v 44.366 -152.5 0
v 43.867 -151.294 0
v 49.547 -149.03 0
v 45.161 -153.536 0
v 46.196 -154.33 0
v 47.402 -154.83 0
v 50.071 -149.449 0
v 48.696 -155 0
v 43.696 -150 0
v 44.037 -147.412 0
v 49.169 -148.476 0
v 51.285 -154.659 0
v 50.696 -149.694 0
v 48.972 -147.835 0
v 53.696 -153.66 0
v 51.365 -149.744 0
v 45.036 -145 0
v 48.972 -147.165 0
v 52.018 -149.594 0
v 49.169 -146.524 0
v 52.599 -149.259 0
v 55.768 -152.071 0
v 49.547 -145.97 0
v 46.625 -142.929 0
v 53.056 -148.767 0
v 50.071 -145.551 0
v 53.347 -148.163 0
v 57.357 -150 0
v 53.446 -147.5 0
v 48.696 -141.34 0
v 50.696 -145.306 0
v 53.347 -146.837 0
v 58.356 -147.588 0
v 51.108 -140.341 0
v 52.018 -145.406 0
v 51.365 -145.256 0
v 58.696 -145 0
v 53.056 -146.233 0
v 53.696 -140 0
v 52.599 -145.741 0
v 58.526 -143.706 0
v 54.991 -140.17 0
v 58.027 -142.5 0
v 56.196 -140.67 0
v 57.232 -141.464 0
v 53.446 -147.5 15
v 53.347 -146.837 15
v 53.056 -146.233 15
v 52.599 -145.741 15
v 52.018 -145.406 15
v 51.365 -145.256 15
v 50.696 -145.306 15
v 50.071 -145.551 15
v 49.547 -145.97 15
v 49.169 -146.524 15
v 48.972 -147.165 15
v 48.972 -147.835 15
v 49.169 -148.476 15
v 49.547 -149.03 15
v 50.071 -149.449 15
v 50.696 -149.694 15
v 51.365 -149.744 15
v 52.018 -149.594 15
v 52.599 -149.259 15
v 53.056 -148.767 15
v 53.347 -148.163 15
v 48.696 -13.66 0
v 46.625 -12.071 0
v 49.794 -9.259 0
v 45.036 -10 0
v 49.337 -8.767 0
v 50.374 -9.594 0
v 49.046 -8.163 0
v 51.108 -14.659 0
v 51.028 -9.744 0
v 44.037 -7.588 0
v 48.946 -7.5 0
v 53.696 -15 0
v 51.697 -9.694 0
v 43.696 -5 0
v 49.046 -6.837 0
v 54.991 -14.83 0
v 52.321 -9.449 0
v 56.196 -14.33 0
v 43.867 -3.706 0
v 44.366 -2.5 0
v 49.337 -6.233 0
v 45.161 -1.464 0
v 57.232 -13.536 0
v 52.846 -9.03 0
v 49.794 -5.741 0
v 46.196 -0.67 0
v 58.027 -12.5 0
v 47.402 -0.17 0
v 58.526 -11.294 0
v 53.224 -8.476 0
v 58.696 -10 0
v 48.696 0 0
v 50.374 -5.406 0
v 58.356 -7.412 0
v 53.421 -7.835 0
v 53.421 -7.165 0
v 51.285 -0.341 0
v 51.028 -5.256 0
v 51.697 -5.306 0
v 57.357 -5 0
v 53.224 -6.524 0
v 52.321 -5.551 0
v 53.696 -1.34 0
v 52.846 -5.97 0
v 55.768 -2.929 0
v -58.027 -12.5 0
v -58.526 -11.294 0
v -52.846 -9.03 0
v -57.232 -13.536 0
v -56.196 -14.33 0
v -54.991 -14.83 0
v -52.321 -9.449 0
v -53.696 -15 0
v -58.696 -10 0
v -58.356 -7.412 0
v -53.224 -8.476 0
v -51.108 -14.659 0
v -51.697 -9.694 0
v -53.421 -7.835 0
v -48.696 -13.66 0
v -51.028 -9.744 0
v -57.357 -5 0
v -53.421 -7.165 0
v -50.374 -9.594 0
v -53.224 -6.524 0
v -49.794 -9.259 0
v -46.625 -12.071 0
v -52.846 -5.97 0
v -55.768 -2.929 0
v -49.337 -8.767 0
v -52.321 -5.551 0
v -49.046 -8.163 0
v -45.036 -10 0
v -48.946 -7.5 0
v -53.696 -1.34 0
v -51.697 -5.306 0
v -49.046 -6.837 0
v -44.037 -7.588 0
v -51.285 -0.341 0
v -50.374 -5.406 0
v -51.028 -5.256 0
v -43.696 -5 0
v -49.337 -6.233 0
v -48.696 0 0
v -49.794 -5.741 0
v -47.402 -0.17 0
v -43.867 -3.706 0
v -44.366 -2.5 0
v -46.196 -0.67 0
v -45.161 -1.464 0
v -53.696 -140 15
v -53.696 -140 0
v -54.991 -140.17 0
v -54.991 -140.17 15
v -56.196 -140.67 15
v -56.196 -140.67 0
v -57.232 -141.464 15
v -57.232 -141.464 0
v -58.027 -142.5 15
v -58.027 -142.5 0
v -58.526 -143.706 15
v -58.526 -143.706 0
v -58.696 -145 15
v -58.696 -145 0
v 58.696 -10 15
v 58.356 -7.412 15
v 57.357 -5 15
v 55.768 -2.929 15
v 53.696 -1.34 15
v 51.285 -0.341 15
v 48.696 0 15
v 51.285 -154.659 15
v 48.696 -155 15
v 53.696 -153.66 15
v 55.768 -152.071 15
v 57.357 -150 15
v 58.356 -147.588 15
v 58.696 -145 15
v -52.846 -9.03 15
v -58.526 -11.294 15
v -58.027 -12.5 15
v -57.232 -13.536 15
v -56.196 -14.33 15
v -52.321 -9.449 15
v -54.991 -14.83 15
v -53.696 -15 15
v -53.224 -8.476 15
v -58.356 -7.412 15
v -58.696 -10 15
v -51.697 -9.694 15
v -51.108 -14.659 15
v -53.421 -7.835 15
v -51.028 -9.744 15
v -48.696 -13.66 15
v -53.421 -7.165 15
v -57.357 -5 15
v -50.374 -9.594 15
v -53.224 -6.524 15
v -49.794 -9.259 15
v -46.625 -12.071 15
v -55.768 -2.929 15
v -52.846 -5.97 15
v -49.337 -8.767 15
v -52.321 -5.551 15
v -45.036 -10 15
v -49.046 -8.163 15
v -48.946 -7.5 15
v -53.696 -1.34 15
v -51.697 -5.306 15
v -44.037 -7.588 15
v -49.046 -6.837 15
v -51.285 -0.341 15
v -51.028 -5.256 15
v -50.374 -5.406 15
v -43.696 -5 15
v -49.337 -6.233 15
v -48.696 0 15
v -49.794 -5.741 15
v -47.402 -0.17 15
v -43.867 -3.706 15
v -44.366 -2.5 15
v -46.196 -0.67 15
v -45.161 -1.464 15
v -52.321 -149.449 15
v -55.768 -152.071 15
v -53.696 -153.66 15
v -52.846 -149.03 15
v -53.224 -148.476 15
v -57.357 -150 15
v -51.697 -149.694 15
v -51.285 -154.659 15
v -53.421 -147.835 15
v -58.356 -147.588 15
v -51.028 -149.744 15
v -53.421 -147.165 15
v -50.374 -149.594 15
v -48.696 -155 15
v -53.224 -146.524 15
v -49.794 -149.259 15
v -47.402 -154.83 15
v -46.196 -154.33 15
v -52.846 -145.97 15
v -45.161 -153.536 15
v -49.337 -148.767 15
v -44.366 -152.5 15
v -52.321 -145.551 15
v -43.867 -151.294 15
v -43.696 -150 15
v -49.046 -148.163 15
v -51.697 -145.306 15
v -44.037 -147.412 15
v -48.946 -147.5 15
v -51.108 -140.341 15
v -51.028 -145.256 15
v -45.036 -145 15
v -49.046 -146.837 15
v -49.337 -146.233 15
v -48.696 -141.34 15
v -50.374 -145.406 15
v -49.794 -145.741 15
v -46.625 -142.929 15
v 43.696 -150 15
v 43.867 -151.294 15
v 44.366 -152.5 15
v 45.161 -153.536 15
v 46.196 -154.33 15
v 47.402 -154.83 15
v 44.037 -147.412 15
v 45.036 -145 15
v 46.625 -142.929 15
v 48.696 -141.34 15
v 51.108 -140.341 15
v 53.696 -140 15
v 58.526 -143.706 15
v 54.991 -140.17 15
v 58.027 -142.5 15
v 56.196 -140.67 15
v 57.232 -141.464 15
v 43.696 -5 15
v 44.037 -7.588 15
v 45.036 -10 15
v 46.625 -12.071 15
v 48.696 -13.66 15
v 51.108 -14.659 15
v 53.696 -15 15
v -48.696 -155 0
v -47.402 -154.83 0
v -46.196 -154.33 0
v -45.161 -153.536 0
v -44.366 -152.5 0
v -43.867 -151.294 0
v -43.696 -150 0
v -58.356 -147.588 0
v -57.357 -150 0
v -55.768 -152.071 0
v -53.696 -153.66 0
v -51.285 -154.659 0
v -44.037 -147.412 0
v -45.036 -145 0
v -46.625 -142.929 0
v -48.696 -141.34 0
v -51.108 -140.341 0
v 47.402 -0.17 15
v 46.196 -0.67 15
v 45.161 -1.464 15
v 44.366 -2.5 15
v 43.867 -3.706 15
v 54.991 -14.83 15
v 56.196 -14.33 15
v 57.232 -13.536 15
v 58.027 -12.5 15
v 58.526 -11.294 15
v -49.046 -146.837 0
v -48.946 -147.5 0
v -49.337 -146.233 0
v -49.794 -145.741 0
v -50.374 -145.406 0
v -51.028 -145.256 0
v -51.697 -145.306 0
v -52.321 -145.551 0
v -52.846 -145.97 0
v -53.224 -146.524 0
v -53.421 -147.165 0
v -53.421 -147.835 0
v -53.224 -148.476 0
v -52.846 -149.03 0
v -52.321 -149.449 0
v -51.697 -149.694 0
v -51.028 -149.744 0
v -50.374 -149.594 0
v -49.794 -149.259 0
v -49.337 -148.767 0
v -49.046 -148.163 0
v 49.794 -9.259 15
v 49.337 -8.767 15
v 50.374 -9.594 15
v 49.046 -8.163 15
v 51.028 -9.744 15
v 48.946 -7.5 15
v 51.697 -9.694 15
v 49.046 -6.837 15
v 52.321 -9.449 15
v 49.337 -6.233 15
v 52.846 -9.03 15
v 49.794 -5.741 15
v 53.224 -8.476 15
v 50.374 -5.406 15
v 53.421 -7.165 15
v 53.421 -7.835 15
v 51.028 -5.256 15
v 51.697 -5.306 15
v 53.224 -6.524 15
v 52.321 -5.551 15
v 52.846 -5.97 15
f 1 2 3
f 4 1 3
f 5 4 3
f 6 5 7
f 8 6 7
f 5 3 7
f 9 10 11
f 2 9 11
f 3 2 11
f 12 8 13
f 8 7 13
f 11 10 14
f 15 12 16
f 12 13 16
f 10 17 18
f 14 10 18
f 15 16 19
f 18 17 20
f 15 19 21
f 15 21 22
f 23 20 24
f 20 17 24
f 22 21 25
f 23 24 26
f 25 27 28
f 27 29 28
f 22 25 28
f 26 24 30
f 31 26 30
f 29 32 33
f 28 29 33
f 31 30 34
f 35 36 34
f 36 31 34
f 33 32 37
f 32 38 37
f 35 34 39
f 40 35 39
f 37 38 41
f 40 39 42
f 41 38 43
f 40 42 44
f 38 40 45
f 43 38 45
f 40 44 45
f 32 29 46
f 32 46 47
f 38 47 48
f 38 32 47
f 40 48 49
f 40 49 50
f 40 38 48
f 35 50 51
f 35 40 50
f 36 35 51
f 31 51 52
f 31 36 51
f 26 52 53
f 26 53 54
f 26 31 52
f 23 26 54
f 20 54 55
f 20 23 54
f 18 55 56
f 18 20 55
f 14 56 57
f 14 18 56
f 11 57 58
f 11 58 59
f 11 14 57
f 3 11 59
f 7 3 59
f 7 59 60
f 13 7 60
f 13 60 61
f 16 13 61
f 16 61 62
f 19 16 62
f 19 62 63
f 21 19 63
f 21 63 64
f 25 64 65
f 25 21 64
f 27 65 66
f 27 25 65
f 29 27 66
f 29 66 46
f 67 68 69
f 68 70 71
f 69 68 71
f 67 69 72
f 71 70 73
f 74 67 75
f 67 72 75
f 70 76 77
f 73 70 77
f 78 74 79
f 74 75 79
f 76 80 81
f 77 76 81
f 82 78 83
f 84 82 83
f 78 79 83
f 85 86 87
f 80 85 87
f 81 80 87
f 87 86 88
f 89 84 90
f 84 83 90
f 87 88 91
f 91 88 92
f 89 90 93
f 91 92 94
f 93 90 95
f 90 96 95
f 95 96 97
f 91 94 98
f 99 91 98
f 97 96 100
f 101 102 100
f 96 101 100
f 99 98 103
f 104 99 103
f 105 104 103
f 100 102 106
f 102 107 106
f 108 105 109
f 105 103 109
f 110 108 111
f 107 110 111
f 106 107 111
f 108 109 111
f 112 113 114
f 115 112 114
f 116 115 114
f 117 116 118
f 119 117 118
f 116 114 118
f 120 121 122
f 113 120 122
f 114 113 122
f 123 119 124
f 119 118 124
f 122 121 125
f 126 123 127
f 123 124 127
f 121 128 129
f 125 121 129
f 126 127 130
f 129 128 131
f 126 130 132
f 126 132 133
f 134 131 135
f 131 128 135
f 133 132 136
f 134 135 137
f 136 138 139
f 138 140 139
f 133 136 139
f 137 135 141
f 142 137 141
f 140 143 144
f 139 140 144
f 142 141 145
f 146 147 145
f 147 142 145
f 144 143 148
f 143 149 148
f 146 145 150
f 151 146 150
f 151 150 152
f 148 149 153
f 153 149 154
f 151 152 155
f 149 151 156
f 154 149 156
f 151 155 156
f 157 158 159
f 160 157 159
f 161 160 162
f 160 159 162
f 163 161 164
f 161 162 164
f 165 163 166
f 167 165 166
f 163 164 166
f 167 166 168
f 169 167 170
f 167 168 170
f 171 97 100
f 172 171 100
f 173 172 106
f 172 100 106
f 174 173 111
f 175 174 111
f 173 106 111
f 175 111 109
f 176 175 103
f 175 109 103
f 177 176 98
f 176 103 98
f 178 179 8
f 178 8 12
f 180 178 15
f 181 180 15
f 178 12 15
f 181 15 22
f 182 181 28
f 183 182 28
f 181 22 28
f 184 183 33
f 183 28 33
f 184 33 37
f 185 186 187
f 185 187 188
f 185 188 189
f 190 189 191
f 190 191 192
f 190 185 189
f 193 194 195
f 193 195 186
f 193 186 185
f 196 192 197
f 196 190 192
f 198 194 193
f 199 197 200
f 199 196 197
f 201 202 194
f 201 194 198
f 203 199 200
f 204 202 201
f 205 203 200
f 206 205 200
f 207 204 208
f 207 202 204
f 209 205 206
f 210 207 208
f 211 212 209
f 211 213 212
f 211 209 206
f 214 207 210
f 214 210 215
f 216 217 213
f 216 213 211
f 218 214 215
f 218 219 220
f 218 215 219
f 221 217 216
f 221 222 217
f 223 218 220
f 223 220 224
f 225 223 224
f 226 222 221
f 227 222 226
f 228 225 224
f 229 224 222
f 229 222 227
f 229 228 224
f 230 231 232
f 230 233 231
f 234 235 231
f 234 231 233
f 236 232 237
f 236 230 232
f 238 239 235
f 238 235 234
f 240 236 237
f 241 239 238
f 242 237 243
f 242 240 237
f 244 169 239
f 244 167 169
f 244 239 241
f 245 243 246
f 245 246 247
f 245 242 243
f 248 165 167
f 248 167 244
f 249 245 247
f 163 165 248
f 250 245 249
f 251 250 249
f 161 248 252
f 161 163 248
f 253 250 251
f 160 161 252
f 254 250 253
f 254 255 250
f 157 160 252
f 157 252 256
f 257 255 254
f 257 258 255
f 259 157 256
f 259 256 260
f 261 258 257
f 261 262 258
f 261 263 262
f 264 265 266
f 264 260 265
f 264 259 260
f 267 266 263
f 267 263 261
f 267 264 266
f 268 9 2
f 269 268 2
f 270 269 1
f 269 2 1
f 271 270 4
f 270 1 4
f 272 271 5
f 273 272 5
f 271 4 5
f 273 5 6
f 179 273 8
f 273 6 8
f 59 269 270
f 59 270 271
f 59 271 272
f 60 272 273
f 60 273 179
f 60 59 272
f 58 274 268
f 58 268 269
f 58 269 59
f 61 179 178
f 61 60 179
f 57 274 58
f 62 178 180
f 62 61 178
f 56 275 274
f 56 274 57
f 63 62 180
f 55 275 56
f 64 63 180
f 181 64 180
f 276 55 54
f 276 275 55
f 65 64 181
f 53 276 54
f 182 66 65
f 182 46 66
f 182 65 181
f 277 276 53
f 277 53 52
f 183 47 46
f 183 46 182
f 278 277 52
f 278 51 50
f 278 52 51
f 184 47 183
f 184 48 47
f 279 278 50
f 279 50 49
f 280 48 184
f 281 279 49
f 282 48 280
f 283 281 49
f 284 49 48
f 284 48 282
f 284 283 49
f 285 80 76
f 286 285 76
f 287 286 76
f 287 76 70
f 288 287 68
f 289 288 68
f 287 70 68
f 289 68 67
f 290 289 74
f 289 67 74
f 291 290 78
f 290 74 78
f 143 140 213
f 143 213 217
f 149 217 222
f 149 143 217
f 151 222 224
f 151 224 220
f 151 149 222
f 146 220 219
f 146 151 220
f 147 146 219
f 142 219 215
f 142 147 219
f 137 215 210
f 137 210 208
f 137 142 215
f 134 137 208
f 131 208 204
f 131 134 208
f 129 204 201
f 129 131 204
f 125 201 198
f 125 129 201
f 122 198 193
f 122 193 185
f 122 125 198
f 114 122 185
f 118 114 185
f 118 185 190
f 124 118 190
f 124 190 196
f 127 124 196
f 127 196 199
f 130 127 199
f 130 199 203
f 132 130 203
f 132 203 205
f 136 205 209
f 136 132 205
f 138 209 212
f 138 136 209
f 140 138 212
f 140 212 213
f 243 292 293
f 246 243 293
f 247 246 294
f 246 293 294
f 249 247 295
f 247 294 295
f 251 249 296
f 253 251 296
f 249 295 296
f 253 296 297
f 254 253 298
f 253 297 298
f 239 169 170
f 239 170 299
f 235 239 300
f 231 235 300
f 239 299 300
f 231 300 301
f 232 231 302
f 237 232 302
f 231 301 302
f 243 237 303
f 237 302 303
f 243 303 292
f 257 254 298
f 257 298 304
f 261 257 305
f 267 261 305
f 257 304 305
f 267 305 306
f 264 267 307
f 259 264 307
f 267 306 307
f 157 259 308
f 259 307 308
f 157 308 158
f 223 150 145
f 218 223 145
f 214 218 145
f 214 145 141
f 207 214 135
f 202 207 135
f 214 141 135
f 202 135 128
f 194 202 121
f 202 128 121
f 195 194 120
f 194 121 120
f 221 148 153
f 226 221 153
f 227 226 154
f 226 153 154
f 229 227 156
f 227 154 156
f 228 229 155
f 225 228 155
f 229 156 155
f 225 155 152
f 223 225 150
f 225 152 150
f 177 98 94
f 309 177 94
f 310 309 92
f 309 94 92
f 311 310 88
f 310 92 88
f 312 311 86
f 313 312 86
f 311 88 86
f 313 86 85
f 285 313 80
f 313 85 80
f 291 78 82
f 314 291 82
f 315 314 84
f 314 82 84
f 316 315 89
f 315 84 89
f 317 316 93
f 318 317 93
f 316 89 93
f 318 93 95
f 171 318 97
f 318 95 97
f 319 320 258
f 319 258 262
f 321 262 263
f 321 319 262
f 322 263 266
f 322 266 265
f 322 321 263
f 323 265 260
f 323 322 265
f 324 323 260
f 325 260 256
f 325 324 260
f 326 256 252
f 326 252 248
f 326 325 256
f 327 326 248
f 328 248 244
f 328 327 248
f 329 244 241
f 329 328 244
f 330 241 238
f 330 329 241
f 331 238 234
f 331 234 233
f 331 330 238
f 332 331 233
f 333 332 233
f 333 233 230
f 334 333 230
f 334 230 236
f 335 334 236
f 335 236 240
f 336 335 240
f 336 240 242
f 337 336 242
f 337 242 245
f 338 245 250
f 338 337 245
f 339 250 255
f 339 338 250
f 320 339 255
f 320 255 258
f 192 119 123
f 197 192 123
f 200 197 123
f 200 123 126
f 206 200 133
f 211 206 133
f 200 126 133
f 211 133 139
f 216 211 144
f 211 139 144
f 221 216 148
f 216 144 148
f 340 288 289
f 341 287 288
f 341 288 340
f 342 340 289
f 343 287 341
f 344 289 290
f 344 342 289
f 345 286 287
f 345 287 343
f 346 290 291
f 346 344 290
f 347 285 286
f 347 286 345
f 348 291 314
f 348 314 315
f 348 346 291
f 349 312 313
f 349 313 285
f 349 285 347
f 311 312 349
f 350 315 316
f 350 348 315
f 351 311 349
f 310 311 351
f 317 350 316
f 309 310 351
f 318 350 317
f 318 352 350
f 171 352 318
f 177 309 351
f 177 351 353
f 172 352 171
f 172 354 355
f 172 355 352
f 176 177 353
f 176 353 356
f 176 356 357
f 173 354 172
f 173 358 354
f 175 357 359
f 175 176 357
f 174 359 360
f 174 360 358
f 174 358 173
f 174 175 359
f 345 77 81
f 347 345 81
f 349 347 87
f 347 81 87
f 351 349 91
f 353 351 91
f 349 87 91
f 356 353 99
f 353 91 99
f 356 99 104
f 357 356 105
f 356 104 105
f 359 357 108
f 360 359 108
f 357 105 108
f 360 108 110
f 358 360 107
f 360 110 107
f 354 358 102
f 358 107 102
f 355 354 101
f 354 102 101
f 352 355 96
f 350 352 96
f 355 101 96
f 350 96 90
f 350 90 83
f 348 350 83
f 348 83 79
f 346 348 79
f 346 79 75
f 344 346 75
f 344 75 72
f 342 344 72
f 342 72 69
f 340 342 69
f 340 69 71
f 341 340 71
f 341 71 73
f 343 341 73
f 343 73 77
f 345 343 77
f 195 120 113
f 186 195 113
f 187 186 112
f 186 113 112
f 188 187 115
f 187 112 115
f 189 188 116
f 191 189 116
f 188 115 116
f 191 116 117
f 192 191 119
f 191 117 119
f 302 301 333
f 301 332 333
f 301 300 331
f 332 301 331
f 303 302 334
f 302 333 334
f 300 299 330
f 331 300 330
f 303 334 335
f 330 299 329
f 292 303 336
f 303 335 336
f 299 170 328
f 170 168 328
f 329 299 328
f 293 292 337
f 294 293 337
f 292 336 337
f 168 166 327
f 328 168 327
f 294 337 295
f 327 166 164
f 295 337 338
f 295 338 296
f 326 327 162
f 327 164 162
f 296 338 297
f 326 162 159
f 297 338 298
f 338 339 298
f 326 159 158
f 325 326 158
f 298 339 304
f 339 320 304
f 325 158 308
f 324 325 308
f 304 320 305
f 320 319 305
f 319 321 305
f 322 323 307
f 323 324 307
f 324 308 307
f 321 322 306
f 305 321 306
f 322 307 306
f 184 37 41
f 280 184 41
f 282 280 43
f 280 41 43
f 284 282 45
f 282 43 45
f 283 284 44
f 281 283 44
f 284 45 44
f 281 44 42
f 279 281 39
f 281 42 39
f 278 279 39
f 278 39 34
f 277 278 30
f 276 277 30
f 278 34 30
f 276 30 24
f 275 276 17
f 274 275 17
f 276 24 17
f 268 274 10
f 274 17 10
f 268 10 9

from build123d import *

# Parameters (mm, degrees)
BOSS_EXTRU_1_DEPTH  = 15
D_GAGEMENT_M41_D    = 4.5
SYM_TRIE1_OUTLINE_R = 2.25
SYM_TRIE1_DEPTH     = 15


# Read off the part's stored shape, not the designer's step: Symétrie1
with BuildPart() as part:
    # Esquisse1 → Boss.-Extru.1 (new body)
    with BuildSketch(Plane.XY):
        with BuildLine():
            ThreePointArc((48.696481526, 0), (45.16094762, -1.464466094), (43.696481526, -5))
            ThreePointArc((43.696481526, -5), (46.625413714, -12.071067812), (53.696481526, -15))
            ThreePointArc((53.696481526, -15), (57.232015432, -13.535533906), (58.696481526, -10))
            ThreePointArc((58.696481526, -10), (55.767549338, -2.928932188), (48.696481526, 0))
        make_face()
    extrude(amount=BOSS_EXTRU_1_DEPTH)

    # Dégagement M41 (through all)
    with Locations(Plane.XY.offset(15)):
        with Locations((51.196481526, -7.5)):
            Hole(D_GAGEMENT_M41_D / 2)


with BuildPart() as body_2:
    # Symétrie1 outline → Symétrie1 (new body)
    # profile 1 of 3: a face of its own
    with BuildSketch(Plane.XY):
        with BuildLine():
            ThreePointArc((-58.696481526, -145), (-55.767549338, -152.071067812), (-48.696481526, -155))
            ThreePointArc((-48.696481526, -155), (-45.16094762, -153.535533906), (-43.696481526, -150))
            ThreePointArc((-43.696481526, -150), (-46.625413714, -142.928932188), (-53.696481526, -140))
            ThreePointArc((-53.696481526, -140), (-57.232015432, -141.464466094), (-58.696481526, -145))
        make_face()
        with Locations((-51.196481526, -147.5)):
            Circle(SYM_TRIE1_OUTLINE_R, mode=Mode.SUBTRACT)
    # profile 2 of 3: a face of its own
    with BuildSketch(Plane.XY):
        with BuildLine():
            ThreePointArc((-48.696481526, 0), (-55.767549338, -2.928932188), (-58.696481526, -10))
            ThreePointArc((-58.696481526, -10), (-57.232015432, -13.535533906), (-53.696481526, -15))
            ThreePointArc((-53.696481526, -15), (-46.625413714, -12.071067812), (-43.696481526, -5))
            ThreePointArc((-43.696481526, -5), (-45.16094762, -1.464466094), (-48.696481526, 0))
        make_face()
        with Locations((-51.196481526, -7.5)):
            Circle(SYM_TRIE1_OUTLINE_R, mode=Mode.SUBTRACT)
    # profile 3 of 3: a face of its own
    with BuildSketch(Plane.XY):
        with BuildLine():
            ThreePointArc((48.696481526, -155), (55.767549338, -152.071067812), (58.696481526, -145))
            ThreePointArc((58.696481526, -145), (57.232015432, -141.464466094), (53.696481526, -140))
            ThreePointArc((53.696481526, -140), (46.625413714, -142.928932188), (43.696481526, -150))
            ThreePointArc((43.696481526, -150), (45.16094762, -153.535533906), (48.696481526, -155))
        make_face()
        with Locations((51.196481526, -147.5)):
            Circle(SYM_TRIE1_OUTLINE_R, mode=Mode.SUBTRACT)
    extrude(amount=SYM_TRIE1_DEPTH)


solid = Compound([part.part, body_2.part])
